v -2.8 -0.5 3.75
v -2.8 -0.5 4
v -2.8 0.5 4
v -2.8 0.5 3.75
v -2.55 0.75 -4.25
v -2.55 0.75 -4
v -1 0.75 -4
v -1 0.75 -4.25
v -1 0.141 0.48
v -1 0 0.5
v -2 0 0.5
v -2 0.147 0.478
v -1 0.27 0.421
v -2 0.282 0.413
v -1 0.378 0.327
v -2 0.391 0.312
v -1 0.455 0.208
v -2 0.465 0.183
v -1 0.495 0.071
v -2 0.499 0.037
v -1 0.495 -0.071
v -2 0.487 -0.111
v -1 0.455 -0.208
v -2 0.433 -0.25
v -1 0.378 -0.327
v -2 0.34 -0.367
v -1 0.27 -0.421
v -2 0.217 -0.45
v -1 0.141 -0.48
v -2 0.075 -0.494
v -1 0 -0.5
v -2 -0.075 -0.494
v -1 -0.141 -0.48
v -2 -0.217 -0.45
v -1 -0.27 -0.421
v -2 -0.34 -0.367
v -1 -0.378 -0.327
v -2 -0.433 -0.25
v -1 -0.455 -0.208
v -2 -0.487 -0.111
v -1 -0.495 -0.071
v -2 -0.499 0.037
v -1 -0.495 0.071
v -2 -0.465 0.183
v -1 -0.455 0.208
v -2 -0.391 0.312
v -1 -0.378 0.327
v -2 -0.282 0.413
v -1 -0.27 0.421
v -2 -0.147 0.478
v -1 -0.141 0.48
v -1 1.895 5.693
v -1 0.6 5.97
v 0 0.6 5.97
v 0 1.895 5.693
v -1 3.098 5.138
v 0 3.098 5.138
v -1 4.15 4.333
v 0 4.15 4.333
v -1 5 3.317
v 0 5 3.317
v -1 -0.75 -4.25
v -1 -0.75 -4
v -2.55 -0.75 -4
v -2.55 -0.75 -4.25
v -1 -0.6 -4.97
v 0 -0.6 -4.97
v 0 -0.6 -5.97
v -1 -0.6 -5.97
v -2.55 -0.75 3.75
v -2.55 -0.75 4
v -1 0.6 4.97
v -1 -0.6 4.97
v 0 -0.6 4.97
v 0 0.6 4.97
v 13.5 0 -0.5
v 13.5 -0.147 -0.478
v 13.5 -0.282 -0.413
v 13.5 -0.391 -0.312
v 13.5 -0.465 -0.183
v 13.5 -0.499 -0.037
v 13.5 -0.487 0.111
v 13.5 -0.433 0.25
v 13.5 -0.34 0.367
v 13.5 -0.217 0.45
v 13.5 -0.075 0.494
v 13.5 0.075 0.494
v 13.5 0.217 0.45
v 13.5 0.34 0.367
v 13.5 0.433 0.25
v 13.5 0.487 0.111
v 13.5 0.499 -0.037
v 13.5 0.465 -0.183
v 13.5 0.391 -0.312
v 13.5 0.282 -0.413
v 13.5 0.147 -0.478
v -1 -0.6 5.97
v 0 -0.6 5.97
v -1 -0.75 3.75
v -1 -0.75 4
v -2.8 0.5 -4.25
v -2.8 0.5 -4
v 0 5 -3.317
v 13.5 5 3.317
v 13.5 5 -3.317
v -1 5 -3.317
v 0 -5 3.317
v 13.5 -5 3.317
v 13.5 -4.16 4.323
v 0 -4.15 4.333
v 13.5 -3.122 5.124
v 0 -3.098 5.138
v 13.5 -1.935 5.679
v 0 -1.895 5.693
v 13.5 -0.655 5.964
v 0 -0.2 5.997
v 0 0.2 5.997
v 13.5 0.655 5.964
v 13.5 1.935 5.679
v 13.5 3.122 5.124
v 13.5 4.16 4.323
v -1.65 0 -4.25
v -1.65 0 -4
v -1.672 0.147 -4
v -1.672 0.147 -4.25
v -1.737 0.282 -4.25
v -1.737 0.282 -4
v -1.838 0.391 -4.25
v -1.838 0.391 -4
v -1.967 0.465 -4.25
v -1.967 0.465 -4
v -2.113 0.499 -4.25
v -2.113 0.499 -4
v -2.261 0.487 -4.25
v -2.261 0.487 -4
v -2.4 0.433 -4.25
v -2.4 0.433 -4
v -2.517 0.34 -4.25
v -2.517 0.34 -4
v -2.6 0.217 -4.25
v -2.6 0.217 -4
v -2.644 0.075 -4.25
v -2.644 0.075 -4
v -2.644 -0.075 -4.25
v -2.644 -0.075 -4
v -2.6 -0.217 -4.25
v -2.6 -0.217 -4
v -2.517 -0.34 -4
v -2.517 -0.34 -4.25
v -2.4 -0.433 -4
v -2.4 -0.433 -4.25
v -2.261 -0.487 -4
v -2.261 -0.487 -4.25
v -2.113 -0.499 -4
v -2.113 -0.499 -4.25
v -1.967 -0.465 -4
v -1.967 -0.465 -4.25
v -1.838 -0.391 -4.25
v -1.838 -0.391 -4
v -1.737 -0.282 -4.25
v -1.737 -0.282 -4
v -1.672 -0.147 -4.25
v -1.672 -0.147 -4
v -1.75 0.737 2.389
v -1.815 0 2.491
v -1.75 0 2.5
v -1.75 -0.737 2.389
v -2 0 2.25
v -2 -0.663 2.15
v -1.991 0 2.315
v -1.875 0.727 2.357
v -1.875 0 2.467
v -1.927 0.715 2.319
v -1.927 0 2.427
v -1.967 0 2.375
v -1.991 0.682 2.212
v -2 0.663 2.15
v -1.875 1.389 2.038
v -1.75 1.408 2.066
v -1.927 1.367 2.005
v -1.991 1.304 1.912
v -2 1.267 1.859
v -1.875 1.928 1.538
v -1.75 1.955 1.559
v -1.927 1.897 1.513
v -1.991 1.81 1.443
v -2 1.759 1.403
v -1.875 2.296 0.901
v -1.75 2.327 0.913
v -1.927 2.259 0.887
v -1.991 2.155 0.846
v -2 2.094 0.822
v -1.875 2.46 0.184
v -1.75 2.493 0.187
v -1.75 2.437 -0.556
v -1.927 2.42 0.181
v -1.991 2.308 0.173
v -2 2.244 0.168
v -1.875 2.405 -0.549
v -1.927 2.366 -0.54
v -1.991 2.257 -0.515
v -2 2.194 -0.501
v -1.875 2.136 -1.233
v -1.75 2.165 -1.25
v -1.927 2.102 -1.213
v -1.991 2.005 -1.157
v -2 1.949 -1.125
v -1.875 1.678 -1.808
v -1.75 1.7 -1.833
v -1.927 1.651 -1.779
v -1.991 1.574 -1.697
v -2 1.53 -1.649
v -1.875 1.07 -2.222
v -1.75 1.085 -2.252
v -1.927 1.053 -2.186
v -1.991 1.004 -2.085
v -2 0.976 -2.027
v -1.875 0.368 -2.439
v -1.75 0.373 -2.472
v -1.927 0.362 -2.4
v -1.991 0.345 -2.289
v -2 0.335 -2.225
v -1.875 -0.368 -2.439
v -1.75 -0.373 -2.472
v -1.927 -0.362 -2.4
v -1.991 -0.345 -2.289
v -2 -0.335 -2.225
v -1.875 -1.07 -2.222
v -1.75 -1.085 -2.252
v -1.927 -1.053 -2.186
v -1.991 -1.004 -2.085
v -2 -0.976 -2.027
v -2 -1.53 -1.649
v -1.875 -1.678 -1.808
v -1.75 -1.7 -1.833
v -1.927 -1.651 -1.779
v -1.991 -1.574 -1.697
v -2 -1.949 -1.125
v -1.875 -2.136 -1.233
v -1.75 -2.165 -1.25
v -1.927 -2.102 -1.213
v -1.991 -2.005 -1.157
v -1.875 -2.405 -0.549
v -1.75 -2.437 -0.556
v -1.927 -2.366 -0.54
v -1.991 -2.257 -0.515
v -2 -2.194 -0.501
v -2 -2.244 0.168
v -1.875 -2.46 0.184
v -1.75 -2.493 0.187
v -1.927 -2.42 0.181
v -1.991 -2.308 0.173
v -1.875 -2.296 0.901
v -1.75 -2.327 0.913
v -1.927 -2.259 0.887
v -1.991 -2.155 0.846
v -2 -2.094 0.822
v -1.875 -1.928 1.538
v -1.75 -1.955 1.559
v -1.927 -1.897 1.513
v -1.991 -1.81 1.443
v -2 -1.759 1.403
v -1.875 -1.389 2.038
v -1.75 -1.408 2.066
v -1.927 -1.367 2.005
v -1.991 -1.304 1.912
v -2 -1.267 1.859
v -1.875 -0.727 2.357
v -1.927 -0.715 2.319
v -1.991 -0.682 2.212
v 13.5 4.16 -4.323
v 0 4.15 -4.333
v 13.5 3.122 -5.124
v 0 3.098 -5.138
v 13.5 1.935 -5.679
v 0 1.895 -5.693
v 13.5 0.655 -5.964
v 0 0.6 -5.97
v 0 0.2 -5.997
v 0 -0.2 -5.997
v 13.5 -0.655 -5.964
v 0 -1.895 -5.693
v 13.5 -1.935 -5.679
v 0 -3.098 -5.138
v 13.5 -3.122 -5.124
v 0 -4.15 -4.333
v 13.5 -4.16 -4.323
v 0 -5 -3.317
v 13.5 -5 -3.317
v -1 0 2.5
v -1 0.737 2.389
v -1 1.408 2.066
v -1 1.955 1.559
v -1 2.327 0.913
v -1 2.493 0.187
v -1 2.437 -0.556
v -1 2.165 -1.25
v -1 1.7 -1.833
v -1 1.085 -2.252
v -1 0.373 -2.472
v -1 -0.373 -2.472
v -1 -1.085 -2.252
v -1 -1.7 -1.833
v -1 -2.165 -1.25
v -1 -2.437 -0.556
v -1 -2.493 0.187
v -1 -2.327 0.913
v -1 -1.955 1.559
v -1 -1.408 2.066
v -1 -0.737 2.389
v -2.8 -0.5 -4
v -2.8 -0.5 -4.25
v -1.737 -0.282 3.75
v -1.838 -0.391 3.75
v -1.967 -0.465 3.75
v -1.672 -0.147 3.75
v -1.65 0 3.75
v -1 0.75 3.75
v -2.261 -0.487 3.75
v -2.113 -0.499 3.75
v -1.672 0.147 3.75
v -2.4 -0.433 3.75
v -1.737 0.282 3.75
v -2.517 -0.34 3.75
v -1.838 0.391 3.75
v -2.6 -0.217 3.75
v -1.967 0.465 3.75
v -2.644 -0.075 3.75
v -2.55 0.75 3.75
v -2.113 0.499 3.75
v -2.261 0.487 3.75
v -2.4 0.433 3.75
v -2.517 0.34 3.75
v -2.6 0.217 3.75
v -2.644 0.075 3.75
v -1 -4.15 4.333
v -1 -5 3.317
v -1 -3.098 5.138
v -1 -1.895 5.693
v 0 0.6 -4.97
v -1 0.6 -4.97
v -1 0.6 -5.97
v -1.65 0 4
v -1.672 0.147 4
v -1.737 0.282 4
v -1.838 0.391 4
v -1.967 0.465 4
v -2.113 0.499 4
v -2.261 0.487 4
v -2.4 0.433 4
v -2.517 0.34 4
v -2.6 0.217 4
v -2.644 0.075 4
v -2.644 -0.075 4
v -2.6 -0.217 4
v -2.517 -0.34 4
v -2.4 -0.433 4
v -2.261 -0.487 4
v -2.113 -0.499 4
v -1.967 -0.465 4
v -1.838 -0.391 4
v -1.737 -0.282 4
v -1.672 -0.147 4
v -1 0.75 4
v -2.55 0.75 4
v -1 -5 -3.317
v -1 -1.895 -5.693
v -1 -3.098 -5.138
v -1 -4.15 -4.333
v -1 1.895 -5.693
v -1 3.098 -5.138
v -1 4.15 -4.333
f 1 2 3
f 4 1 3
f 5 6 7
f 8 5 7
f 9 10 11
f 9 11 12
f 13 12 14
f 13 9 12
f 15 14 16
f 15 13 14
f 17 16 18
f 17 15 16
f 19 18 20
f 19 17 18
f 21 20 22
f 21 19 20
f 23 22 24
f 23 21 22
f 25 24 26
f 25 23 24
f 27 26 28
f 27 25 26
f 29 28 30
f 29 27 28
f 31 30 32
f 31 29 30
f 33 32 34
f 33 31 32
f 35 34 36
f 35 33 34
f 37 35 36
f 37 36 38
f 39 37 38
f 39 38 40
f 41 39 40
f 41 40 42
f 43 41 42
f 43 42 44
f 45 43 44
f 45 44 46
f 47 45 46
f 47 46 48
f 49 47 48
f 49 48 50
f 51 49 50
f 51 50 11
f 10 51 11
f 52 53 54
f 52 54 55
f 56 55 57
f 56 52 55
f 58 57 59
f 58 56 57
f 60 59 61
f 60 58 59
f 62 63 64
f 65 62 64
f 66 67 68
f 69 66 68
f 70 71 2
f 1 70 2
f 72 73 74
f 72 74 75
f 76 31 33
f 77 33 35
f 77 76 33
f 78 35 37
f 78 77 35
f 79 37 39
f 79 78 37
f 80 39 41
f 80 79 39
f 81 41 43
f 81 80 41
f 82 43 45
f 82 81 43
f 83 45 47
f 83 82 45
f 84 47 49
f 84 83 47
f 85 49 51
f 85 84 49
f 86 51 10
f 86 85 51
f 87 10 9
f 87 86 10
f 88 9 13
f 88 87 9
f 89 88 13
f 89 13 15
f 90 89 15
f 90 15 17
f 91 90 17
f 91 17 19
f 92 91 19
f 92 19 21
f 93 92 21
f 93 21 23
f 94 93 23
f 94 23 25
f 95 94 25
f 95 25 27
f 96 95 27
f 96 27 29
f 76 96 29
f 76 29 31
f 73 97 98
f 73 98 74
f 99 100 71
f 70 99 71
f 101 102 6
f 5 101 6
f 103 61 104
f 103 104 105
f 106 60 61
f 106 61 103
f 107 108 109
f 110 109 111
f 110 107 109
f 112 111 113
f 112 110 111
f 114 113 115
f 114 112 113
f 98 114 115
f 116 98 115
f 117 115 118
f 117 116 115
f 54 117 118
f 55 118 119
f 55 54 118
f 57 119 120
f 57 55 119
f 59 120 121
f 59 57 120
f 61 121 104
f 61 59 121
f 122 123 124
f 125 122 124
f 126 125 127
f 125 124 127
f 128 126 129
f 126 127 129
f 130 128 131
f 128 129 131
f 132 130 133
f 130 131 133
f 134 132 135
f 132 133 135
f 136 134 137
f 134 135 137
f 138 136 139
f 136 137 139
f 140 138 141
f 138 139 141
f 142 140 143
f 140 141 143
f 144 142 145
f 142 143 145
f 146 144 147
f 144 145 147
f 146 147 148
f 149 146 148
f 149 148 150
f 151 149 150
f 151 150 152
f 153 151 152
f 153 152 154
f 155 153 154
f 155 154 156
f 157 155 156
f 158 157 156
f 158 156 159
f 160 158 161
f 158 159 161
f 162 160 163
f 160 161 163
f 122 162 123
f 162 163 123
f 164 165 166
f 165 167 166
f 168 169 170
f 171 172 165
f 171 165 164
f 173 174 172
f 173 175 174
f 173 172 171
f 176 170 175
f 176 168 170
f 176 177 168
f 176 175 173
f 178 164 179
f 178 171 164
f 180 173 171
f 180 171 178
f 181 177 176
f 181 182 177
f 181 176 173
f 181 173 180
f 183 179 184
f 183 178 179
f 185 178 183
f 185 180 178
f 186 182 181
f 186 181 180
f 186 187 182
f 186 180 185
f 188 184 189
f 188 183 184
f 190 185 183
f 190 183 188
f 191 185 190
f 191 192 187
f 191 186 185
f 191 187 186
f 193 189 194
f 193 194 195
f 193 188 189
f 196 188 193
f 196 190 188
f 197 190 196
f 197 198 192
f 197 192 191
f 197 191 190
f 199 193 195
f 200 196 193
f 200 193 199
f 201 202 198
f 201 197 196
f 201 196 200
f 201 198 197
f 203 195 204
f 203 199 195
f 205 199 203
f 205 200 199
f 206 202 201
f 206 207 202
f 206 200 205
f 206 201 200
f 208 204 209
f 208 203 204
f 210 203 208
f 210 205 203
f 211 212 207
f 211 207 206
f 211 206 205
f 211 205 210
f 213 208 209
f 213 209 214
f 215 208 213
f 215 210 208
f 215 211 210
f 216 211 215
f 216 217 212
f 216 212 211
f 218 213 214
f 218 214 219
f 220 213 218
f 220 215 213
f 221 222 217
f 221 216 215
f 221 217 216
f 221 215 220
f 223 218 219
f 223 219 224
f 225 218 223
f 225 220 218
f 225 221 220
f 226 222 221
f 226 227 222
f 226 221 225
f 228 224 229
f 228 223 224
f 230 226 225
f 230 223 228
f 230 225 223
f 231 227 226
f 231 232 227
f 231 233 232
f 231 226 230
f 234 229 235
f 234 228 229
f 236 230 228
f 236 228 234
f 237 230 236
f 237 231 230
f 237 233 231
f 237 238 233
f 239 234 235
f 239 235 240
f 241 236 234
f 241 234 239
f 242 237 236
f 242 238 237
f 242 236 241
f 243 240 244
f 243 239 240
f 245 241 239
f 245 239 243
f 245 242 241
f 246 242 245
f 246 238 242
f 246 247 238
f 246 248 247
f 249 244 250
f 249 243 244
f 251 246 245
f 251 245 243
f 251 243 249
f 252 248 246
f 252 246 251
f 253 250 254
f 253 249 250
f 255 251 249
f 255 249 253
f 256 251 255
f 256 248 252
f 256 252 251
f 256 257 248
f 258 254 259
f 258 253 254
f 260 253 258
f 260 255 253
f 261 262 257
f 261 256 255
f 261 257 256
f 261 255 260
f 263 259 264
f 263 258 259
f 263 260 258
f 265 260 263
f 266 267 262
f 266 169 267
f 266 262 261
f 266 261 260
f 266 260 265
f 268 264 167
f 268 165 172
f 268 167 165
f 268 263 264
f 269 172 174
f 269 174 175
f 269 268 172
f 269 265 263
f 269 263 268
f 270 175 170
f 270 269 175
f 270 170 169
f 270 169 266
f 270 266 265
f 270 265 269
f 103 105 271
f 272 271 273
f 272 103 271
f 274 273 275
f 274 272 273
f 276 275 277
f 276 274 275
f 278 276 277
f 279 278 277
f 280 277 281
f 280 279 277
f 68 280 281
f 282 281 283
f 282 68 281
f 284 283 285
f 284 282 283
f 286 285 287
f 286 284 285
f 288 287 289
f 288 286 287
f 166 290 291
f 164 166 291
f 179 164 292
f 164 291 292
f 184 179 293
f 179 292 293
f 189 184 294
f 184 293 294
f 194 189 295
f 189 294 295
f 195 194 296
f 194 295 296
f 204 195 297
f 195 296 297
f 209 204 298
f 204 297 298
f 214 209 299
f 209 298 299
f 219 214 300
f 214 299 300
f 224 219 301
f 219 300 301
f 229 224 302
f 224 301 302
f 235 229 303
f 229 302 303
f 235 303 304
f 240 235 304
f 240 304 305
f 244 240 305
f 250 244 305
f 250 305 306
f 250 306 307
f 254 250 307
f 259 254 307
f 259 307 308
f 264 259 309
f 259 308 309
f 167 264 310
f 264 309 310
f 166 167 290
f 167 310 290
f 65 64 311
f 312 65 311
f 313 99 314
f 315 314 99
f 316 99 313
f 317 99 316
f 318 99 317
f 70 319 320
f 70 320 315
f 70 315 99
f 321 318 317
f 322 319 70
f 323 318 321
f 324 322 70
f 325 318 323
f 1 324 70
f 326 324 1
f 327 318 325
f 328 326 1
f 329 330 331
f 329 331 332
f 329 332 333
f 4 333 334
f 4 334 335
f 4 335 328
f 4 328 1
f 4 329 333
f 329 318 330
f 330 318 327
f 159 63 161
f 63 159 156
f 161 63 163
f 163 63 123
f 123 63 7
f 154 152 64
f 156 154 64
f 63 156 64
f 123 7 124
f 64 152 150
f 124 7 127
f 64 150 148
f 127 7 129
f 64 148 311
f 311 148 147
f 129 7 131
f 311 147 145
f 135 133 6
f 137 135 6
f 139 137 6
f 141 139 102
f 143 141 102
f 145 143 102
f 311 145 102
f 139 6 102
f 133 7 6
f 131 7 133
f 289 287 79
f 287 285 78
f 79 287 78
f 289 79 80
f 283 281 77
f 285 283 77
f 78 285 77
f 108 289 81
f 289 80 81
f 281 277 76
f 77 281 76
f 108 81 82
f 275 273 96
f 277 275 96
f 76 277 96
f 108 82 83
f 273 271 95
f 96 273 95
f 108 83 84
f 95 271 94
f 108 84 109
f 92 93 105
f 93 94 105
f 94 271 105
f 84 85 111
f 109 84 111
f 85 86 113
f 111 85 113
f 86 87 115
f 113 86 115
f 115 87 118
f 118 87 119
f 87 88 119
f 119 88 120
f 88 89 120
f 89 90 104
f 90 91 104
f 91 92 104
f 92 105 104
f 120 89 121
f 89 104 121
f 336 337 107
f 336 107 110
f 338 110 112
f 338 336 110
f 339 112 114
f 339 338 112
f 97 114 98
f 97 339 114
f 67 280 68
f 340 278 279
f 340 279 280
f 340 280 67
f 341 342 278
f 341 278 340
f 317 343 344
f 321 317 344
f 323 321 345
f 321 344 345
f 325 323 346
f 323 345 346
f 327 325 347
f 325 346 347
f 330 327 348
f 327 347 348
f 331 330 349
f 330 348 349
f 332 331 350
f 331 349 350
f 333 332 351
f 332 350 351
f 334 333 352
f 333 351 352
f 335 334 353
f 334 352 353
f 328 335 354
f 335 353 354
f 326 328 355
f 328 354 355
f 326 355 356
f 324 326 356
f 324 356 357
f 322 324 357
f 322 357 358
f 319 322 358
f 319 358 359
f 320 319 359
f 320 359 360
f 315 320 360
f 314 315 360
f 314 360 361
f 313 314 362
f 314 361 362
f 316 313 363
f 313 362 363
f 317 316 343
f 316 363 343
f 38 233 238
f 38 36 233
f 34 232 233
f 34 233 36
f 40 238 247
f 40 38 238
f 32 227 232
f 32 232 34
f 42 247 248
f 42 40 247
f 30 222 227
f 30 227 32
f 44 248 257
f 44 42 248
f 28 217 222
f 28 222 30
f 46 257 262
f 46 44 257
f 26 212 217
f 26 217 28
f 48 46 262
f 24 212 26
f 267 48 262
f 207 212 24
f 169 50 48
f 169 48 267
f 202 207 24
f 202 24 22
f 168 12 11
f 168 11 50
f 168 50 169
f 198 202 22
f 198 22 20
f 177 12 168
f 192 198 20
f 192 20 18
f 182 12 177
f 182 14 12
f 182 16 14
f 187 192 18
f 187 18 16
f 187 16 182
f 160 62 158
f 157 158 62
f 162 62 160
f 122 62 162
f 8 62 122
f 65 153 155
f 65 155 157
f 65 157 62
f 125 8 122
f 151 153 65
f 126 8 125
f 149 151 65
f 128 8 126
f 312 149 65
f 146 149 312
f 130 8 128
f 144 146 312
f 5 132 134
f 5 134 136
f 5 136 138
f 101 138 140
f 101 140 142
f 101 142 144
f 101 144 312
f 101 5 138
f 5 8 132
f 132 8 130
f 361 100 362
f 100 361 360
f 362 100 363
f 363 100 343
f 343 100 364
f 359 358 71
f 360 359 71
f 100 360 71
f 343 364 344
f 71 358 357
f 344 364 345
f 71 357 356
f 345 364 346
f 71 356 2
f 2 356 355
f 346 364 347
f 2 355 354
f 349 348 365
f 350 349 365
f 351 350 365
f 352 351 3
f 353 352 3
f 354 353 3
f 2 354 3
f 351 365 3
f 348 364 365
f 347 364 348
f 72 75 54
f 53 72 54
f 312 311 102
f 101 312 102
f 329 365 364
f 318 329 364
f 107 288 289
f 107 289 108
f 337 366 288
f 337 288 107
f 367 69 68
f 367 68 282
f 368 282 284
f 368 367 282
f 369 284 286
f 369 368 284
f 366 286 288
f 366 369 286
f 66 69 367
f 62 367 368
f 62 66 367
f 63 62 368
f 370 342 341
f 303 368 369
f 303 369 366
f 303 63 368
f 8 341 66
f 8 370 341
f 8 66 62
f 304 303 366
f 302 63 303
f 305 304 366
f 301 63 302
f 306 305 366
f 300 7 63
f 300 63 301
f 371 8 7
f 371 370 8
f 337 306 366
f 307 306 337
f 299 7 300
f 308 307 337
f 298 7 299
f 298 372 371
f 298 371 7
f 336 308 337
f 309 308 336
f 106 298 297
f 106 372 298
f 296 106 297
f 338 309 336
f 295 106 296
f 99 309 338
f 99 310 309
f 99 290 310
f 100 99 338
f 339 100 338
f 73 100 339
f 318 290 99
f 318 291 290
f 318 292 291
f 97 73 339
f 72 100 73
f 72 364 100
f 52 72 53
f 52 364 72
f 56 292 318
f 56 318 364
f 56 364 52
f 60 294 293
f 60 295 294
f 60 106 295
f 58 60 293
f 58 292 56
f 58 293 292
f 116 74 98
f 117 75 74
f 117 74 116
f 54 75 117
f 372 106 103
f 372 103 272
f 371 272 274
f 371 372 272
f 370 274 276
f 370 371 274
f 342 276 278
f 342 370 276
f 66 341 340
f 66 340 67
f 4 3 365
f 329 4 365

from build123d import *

# Parameters (mm, degrees)
SALIENTE_EXTRUIR1_DEPTH = 13.5
SALIENTE_EXTRUIR2_START = 1
SALIENTE_EXTRUIR2_DEPTH = 1
CROQUIS3_R              = 2.5
CROQUIS3_R_2            = 0.5
SALIENTE_EXTRUIR3_DEPTH = 1
REDONDEO1_R             = 0.25
CORTAR_EXTRUIR1_START   = -14.5
CROQUIS3_2_R            = 0.5
CORTAR_EXTRUIR1_DEPTH   = 14.5
CROQUIS4_R              = 0.5
SALIENTE_EXTRUIR4_DEPTH = 0.25
MATRIZL1_COUNT          = 2
MATRIZL1_PITCH          = 8


with BuildPart() as part:
    # Croquis1 → Saliente-Extruir1 (new body)
    with BuildSketch(Plane(origin=(0, 0, 0), x_dir=(0, 0, -1), z_dir=(1, 0, 0))):
        with BuildLine():
            Line((-3.31662479, 5), (3.31662479, 5))
            ThreePointArc((3.31662479, 5), (6, 0), (3.31662479, -5))
            Line((3.31662479, -5), (-3.31662479, -5))
            ThreePointArc((-3.31662479, -5), (-6, 0), (-3.31662479, 5))
        make_face()
    extrude(amount=SALIENTE_EXTRUIR1_DEPTH)

    # Croquis2 → Saliente-Extruir2 (add)
    with BuildSketch(Plane.ZY.offset(SALIENTE_EXTRUIR2_START)):
        with BuildLine():
            Line((-4.969924623, 0.6), (-4.969924623, -0.6))
            Line((-4.969924623, -0.6), (-5.969924623, -0.6))
            ThreePointArc((-5.969924623, -0.6), (-5.138093031, -3.098386677), (-3.31662479, -5))
            Line((-3.31662479, -5), (3.31662479, -5))
            ThreePointArc((3.31662479, -5), (5.138093031, -3.098386677), (5.969924623, -0.6))
            Line((5.969924623, -0.6), (4.969924623, -0.6))
            Line((4.969924623, -0.6), (4.969924623, 0.6))
            Line((4.969924623, 0.6), (5.969924623, 0.6))
            ThreePointArc((5.969924623, 0.6), (5.138093031, 3.098386677), (3.31662479, 5))
            Line((3.31662479, 5), (-3.31662479, 5))
            ThreePointArc((-3.31662479, 5), (-5.138093031, 3.098386677), (-5.969924623, 0.6))
            Line((-5.969924623, 0.6), (-4.969924623, 0.6))
        make_face()
    extrude(amount=-SALIENTE_EXTRUIR2_DEPTH)

    # Croquis3 → Saliente-Extruir3 (add)
    with BuildSketch(Plane.ZY.offset(1)):
        Circle(CROQUIS3_R)
        Circle(CROQUIS3_R_2, mode=Mode.SUBTRACT)
    extrude(amount=SALIENTE_EXTRUIR3_DEPTH)

    # Redondeo1
    redondeo1_edges = [part.edges().sort_by_distance(p)[0] for p in [
        (-2, 0, -2.5),
    ]]
    fillet(redondeo1_edges, radius=REDONDEO1_R)

    # Croquis3<2> → Cortar-Extruir1 (cut)
    with BuildSketch(Plane.ZY.offset(1).offset(CORTAR_EXTRUIR1_START)):
        with Locations(Location((0, 0, 0), (0, 0, 180))):
            Circle(CROQUIS3_2_R)
    extrude(amount=CORTAR_EXTRUIR1_DEPTH, mode=Mode.SUBTRACT)

    # Croquis4 → Saliente-Extruir4 (add)
    with BuildSketch(Plane.XY.offset(4)):
        Polygon((-2.55, 0.75), (-1, 0.75), (-1, -0.75), (-2.55, -0.75), (-2.8, -0.5), (-2.8, 0.5), align=None)
        with Locations((-2.15, 0)):
            Circle(CROQUIS4_R, mode=Mode.SUBTRACT)
    saliente_extruir4 = extrude(amount=-SALIENTE_EXTRUIR4_DEPTH)

    # MatrizL1: Saliente-Extruir4 ×2
    with Locations(*[(0, 0, -i * MATRIZL1_PITCH) for i in range(1, MATRIZL1_COUNT)]):
        add(saliente_extruir4)


solid = part.part
